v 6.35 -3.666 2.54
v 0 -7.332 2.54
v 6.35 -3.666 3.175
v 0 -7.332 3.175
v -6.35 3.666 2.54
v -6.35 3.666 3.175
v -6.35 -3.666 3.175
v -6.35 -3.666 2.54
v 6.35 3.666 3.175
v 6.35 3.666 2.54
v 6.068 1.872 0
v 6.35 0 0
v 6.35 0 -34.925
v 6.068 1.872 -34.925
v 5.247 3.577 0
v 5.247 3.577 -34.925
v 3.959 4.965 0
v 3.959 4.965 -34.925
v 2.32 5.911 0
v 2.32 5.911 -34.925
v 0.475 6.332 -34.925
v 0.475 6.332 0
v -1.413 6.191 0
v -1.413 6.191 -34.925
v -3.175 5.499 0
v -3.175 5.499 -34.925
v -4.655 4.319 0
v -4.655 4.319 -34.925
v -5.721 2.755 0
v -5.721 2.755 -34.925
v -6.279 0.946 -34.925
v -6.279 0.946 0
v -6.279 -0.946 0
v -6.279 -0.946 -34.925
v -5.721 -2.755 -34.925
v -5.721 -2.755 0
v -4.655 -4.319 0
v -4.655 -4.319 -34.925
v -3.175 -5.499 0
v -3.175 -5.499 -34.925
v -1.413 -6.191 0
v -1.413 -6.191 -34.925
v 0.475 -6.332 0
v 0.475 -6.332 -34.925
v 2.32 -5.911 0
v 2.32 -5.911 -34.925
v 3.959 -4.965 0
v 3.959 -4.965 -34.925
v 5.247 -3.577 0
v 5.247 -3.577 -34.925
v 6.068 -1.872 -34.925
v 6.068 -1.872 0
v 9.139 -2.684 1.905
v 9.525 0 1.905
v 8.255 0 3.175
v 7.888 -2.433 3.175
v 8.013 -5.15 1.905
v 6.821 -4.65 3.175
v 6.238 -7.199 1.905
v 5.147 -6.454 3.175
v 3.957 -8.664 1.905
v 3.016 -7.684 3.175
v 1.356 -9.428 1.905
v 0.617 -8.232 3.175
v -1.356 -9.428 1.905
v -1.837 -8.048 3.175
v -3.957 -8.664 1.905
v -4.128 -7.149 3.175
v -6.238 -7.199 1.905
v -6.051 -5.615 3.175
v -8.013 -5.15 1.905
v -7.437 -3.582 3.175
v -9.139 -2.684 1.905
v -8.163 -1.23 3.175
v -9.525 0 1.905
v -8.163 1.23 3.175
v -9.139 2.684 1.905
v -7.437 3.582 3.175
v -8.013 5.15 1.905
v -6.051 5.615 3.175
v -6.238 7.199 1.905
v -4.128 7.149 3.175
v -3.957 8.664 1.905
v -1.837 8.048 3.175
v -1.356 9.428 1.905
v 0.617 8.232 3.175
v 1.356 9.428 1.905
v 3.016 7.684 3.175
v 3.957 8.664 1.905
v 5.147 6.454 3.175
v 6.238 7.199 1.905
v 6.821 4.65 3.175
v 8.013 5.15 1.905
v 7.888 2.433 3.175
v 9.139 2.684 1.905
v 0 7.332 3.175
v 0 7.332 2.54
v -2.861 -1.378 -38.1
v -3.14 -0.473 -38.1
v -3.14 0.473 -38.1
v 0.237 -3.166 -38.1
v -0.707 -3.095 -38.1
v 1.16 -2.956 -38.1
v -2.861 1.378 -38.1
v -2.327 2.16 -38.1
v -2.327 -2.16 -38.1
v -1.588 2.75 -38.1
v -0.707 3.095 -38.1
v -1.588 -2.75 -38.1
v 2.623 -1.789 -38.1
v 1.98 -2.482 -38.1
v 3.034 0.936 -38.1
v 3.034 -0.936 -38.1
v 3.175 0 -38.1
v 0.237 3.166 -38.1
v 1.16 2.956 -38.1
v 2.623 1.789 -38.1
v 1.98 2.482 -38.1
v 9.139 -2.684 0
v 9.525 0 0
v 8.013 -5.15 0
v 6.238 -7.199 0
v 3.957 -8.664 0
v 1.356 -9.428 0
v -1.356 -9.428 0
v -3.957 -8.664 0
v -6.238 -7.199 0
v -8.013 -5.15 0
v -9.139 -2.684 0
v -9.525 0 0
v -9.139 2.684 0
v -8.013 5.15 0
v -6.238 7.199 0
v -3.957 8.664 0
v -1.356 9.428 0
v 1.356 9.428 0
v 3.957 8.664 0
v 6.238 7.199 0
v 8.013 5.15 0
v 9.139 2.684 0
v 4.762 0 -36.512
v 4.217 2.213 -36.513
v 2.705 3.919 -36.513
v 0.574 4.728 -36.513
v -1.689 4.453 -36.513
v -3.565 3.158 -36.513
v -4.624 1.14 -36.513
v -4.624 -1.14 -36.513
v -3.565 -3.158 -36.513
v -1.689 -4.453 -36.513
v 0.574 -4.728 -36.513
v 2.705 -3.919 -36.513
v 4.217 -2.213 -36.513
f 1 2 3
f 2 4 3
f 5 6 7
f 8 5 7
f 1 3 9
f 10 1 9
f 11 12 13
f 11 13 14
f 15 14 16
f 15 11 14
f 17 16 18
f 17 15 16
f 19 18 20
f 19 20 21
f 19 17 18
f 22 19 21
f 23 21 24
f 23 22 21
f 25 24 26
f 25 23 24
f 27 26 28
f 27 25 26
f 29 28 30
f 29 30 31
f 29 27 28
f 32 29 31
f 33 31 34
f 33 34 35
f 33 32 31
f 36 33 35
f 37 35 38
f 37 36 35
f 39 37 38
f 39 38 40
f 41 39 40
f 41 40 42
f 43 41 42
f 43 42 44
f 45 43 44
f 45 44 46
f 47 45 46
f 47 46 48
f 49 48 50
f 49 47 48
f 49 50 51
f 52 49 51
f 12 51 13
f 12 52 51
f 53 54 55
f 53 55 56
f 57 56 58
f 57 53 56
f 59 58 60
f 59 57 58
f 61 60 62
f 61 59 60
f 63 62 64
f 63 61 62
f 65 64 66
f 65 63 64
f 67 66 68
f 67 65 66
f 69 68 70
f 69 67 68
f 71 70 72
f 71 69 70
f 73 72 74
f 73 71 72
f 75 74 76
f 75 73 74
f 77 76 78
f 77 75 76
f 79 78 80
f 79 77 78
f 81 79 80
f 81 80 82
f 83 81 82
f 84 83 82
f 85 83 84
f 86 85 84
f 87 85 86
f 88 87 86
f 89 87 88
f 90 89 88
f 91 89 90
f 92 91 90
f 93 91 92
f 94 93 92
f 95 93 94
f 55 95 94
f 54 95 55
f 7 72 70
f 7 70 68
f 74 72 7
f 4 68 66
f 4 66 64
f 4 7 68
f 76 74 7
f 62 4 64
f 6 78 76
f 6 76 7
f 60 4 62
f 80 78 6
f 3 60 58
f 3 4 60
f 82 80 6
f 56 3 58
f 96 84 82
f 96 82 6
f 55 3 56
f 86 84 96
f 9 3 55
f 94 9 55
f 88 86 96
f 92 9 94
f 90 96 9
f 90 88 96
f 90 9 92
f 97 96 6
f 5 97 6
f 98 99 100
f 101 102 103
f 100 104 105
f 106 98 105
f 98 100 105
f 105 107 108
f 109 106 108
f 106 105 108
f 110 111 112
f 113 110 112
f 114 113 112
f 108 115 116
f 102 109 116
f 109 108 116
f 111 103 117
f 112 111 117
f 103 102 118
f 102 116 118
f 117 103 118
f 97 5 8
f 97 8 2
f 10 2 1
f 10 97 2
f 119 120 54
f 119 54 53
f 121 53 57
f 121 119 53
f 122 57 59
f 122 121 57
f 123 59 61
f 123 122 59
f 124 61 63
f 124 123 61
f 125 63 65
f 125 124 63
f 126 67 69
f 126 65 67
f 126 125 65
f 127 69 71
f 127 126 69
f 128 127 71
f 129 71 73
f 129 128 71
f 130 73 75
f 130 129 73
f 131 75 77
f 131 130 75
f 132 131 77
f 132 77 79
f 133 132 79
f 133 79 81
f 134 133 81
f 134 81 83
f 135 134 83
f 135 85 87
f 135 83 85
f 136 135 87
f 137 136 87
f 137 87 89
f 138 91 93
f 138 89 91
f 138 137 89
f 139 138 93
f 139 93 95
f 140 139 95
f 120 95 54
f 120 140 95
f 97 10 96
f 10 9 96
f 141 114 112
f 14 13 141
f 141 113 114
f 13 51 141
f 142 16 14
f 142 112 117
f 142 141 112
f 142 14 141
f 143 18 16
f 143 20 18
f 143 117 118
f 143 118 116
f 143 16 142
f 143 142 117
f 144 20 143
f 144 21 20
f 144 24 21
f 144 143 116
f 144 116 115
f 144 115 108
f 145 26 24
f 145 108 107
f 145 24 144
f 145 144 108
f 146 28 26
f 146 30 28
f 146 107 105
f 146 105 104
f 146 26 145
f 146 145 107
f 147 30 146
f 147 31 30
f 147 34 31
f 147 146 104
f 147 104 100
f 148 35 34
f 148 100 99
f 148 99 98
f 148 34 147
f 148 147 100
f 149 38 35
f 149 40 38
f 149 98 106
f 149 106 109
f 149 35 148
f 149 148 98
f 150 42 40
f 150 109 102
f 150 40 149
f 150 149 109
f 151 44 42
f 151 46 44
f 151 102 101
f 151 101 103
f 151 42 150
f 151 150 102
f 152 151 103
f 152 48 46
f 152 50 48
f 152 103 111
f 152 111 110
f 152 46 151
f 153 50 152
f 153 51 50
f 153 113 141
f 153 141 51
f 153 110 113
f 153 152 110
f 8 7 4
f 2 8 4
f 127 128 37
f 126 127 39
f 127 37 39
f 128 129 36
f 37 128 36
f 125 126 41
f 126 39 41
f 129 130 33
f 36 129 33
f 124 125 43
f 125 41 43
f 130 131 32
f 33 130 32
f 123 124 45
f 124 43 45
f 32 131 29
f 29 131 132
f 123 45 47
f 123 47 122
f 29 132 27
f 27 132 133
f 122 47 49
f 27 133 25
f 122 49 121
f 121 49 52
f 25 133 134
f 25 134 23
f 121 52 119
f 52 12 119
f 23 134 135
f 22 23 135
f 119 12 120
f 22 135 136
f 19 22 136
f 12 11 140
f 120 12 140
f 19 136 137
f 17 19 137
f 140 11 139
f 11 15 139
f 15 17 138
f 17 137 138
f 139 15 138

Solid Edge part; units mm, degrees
sketch "Sketch1" plane through (0, 0, 0) normal (0, 0, 1) x (1, 0, 0)
  circle A0 centre (0, 0) radius 6.35
extrude "Protrusion1" add sketch "Sketch1" against normal blind 38.1
sketch "Sketch2" plane through (0, 0, 0) normal (0, 0, 1) x (1, 0, 0)
  circle A0 centre (0, 0) radius 9.525
extrude "ExtrudedProtrusion_2" add sketch "Sketch2" along normal blind 3.175
sketch "Sketch3" plane through (0, 0, 3.175) normal (0, 0, 1) x (1, 0, 0)
  line L0 (0, 7.3323) -> (-6.35, 3.6662)
  line L1 (-6.35, 3.6662) -> (-6.35, -3.6662)
  line L2 (-6.35, -3.6662) -> (0, -7.3323)
  line L3 (0, -7.3323) -> (6.35, -3.6662)
  line L4 (6.35, -3.6662) -> (6.35, 3.6662)
  line L5 (6.35, 3.6662) -> (0, 7.3323)
extrude "ExtrudedCutout_1" cut sketch "Sketch3" against normal blind 0.635
chamfer "Chamfer_1" distance 3.175 angle 45 1 edges at (-6.35, 0, -38.1)
chamfer "Chamfer_2" distance 1.27 angle 45 1 edges at (-9.525, 0, 3.175)
